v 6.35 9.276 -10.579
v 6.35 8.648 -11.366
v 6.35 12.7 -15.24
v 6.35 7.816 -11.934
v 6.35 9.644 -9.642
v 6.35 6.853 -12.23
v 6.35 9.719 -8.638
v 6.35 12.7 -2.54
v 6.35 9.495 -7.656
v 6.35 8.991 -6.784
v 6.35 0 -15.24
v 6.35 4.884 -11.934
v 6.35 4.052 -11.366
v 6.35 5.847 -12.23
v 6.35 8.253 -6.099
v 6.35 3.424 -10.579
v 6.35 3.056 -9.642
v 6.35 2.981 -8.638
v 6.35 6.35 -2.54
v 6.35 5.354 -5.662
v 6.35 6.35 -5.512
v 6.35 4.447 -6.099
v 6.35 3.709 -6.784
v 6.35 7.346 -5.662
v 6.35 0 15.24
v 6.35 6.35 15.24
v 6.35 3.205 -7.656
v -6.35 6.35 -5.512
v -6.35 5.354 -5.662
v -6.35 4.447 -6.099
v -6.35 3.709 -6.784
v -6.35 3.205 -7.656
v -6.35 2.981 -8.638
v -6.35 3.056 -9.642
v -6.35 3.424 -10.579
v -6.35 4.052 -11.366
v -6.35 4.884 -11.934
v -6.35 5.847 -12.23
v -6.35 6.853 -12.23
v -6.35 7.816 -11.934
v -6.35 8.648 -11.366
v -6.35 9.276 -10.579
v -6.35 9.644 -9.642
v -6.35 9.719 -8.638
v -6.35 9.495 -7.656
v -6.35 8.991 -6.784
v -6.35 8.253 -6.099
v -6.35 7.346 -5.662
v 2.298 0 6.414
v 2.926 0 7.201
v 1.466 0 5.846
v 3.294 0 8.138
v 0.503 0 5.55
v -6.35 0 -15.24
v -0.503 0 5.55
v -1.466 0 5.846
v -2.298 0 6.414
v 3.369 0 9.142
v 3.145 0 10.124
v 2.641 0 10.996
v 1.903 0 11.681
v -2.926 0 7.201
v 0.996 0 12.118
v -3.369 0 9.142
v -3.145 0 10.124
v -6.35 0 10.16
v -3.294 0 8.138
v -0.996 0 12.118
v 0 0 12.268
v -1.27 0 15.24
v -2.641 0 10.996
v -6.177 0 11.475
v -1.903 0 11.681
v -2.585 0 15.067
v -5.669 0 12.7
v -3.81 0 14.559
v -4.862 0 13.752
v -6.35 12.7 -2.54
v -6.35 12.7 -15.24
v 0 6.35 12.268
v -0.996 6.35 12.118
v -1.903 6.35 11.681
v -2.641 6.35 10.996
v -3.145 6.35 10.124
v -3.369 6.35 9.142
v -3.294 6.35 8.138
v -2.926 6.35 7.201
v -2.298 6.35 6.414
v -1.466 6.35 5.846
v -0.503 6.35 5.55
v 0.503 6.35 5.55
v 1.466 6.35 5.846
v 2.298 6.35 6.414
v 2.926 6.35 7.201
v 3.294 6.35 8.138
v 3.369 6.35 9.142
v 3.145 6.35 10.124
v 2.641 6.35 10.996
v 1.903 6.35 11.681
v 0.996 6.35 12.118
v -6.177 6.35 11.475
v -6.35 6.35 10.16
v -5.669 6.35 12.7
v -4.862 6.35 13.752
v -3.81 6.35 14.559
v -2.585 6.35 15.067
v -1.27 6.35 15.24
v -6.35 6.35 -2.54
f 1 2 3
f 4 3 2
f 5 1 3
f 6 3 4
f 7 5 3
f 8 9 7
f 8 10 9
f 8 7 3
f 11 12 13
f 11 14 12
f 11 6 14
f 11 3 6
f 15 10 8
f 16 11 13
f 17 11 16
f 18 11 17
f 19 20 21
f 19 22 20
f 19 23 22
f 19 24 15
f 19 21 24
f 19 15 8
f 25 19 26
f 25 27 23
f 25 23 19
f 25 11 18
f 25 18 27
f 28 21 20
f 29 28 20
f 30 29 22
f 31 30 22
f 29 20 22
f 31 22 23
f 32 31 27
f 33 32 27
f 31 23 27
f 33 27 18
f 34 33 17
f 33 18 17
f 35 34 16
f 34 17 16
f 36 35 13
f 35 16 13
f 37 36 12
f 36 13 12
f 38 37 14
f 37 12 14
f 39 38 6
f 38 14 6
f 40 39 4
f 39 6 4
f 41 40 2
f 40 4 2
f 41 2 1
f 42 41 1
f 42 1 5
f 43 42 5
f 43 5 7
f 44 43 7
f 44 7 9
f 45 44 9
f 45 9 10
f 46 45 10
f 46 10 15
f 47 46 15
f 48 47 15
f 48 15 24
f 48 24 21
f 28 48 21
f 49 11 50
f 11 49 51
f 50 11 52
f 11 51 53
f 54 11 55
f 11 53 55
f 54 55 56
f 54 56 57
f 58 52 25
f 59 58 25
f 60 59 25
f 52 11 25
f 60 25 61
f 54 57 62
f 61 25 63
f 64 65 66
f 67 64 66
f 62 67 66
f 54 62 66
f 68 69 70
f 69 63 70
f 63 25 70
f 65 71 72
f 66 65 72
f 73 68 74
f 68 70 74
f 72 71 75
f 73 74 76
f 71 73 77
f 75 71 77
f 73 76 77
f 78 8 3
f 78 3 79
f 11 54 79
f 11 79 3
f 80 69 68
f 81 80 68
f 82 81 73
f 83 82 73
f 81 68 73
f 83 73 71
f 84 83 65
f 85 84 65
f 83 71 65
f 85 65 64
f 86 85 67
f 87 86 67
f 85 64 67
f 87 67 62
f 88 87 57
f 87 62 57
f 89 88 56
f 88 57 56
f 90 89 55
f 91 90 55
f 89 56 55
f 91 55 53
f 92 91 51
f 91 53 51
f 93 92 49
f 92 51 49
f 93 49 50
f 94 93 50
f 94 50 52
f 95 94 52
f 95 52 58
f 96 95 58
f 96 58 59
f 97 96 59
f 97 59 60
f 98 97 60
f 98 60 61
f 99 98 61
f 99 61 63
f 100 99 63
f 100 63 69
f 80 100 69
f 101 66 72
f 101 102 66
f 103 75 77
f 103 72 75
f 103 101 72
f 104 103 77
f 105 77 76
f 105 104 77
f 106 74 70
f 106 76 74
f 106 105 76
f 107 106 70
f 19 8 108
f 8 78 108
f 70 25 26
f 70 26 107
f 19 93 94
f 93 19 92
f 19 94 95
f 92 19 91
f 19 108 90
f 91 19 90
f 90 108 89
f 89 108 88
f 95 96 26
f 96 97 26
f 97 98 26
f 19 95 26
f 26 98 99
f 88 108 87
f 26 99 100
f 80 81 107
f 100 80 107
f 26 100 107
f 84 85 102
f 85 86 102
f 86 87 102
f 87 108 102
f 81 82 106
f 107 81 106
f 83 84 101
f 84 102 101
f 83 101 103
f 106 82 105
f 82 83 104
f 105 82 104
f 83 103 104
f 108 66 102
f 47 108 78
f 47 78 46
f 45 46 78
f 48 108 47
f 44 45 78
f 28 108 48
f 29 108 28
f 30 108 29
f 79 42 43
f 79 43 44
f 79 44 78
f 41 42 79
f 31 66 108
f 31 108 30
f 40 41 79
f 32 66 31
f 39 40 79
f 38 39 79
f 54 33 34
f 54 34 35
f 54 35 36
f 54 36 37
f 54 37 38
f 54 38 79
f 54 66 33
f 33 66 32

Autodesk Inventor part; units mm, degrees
ref_plane "YZ Plane" through (0, 0, 0) normal (1, 0, 0) x (0, 1, 0)
ref_plane "XZ Plane" through (0, 0, 0) normal (0, 1, 0) x (-1, 0, 0)
ref_plane "XY Plane" through (0, 0, 0) normal (0, 0, 1) x (1, 0, 0)
sketch "Sketch1" plane through (0, 0, 0) normal (0, 1, 0) x (-1, 0, 0)
  line L0 (-6.35, 15.24) -> (6.35, 15.24)
  line L1 (6.35, 15.24) -> (6.35, -15.24)
  line L2 (6.35, -15.24) -> (-6.35, -15.24)
  line L3 (-6.35, -15.24) -> (-6.35, 15.24)
  line L4 (-6.35, 15.24) -> (6.35, -15.24) construction
  line L5 (6.35, 15.24) -> (-6.35, -15.24) construction
  point P0 (0, 0)
  dimension "d0" = 12.7
  dimension "d1" = 30.48
extrude "Extrusion1" add sketch "Sketch1" along normal blind 12.7
sketch "Sketch2" plane through (0, 12.7, 0) normal (0, 1, 0) x (1, 0, 0)
  line L0 (-6.35, -15.24) -> (6.35, -15.24) projected
  line L1 (0, -15.24) -> (0, -8.89) construction
  point P0 (0, 0)
  dimension "d27" = 6.35
hole "Hole1" at (0, 12.7, 8.89) direction (0, -1, 0) diameter 6.7564 end through all clearance for "Flat Head Machine Screw (82)" size "1/4" standard "Ansi Unified Screw Threads"
sketch "Sketch3" plane through (-6.35, 0, -15.24) normal (-1, 0, 0) x (0, 0, 1)
  line L0 (0, 0) -> (30.48, 0) projected
  line L1 (0, 0) -> (0, 6.35) construction
  line L2 (0, 0) -> (0, 12.7) projected
  line L3 (0, 6.35) -> (6.35, 6.35) construction
  point P0 (15.24, 0)
  dimension "d12" = 6.35
  dimension "d13" = 6.35
  dimension "d14" = 90
hole "Hole2" at (-6.35, 6.35, -8.89) direction (1, 0, 0) diameter 6.7564 end through all clearance for "Flat Head Machine Screw (82)" size "1/4" standard "Ansi Unified Screw Threads"
sketch "Sketch4" plane through (-6.35, 0, -15.24) normal (-1, 0, 0) x (0, 0, 1)
  line L0 (30.48, 0) -> (30.48, 12.7) projected
  line L1 (30.48, 12.7) -> (12.7, 12.7)
  line L2 (12.7, 12.7) -> (12.7, 6.35)
  line L3 (12.7, 6.35) -> (30.48, 6.35)
  line L4 (30.48, 6.35) -> (30.48, 12.7)
  line L5 (0, 0) -> (0, 12.7) projected
  point P0 (15.24, 0)
  dimension "d23" = 6.35
  dimension "d28" = 12.7
extrude "Extrusion2" cut sketch "Sketch4" against normal up to surface (12.7 mm away)
fillet "Fillet2" radius 5.08 1 edges at (-6.35, 3.175, 15.24)
properties part number "mount" material "Aluminum 6061"
